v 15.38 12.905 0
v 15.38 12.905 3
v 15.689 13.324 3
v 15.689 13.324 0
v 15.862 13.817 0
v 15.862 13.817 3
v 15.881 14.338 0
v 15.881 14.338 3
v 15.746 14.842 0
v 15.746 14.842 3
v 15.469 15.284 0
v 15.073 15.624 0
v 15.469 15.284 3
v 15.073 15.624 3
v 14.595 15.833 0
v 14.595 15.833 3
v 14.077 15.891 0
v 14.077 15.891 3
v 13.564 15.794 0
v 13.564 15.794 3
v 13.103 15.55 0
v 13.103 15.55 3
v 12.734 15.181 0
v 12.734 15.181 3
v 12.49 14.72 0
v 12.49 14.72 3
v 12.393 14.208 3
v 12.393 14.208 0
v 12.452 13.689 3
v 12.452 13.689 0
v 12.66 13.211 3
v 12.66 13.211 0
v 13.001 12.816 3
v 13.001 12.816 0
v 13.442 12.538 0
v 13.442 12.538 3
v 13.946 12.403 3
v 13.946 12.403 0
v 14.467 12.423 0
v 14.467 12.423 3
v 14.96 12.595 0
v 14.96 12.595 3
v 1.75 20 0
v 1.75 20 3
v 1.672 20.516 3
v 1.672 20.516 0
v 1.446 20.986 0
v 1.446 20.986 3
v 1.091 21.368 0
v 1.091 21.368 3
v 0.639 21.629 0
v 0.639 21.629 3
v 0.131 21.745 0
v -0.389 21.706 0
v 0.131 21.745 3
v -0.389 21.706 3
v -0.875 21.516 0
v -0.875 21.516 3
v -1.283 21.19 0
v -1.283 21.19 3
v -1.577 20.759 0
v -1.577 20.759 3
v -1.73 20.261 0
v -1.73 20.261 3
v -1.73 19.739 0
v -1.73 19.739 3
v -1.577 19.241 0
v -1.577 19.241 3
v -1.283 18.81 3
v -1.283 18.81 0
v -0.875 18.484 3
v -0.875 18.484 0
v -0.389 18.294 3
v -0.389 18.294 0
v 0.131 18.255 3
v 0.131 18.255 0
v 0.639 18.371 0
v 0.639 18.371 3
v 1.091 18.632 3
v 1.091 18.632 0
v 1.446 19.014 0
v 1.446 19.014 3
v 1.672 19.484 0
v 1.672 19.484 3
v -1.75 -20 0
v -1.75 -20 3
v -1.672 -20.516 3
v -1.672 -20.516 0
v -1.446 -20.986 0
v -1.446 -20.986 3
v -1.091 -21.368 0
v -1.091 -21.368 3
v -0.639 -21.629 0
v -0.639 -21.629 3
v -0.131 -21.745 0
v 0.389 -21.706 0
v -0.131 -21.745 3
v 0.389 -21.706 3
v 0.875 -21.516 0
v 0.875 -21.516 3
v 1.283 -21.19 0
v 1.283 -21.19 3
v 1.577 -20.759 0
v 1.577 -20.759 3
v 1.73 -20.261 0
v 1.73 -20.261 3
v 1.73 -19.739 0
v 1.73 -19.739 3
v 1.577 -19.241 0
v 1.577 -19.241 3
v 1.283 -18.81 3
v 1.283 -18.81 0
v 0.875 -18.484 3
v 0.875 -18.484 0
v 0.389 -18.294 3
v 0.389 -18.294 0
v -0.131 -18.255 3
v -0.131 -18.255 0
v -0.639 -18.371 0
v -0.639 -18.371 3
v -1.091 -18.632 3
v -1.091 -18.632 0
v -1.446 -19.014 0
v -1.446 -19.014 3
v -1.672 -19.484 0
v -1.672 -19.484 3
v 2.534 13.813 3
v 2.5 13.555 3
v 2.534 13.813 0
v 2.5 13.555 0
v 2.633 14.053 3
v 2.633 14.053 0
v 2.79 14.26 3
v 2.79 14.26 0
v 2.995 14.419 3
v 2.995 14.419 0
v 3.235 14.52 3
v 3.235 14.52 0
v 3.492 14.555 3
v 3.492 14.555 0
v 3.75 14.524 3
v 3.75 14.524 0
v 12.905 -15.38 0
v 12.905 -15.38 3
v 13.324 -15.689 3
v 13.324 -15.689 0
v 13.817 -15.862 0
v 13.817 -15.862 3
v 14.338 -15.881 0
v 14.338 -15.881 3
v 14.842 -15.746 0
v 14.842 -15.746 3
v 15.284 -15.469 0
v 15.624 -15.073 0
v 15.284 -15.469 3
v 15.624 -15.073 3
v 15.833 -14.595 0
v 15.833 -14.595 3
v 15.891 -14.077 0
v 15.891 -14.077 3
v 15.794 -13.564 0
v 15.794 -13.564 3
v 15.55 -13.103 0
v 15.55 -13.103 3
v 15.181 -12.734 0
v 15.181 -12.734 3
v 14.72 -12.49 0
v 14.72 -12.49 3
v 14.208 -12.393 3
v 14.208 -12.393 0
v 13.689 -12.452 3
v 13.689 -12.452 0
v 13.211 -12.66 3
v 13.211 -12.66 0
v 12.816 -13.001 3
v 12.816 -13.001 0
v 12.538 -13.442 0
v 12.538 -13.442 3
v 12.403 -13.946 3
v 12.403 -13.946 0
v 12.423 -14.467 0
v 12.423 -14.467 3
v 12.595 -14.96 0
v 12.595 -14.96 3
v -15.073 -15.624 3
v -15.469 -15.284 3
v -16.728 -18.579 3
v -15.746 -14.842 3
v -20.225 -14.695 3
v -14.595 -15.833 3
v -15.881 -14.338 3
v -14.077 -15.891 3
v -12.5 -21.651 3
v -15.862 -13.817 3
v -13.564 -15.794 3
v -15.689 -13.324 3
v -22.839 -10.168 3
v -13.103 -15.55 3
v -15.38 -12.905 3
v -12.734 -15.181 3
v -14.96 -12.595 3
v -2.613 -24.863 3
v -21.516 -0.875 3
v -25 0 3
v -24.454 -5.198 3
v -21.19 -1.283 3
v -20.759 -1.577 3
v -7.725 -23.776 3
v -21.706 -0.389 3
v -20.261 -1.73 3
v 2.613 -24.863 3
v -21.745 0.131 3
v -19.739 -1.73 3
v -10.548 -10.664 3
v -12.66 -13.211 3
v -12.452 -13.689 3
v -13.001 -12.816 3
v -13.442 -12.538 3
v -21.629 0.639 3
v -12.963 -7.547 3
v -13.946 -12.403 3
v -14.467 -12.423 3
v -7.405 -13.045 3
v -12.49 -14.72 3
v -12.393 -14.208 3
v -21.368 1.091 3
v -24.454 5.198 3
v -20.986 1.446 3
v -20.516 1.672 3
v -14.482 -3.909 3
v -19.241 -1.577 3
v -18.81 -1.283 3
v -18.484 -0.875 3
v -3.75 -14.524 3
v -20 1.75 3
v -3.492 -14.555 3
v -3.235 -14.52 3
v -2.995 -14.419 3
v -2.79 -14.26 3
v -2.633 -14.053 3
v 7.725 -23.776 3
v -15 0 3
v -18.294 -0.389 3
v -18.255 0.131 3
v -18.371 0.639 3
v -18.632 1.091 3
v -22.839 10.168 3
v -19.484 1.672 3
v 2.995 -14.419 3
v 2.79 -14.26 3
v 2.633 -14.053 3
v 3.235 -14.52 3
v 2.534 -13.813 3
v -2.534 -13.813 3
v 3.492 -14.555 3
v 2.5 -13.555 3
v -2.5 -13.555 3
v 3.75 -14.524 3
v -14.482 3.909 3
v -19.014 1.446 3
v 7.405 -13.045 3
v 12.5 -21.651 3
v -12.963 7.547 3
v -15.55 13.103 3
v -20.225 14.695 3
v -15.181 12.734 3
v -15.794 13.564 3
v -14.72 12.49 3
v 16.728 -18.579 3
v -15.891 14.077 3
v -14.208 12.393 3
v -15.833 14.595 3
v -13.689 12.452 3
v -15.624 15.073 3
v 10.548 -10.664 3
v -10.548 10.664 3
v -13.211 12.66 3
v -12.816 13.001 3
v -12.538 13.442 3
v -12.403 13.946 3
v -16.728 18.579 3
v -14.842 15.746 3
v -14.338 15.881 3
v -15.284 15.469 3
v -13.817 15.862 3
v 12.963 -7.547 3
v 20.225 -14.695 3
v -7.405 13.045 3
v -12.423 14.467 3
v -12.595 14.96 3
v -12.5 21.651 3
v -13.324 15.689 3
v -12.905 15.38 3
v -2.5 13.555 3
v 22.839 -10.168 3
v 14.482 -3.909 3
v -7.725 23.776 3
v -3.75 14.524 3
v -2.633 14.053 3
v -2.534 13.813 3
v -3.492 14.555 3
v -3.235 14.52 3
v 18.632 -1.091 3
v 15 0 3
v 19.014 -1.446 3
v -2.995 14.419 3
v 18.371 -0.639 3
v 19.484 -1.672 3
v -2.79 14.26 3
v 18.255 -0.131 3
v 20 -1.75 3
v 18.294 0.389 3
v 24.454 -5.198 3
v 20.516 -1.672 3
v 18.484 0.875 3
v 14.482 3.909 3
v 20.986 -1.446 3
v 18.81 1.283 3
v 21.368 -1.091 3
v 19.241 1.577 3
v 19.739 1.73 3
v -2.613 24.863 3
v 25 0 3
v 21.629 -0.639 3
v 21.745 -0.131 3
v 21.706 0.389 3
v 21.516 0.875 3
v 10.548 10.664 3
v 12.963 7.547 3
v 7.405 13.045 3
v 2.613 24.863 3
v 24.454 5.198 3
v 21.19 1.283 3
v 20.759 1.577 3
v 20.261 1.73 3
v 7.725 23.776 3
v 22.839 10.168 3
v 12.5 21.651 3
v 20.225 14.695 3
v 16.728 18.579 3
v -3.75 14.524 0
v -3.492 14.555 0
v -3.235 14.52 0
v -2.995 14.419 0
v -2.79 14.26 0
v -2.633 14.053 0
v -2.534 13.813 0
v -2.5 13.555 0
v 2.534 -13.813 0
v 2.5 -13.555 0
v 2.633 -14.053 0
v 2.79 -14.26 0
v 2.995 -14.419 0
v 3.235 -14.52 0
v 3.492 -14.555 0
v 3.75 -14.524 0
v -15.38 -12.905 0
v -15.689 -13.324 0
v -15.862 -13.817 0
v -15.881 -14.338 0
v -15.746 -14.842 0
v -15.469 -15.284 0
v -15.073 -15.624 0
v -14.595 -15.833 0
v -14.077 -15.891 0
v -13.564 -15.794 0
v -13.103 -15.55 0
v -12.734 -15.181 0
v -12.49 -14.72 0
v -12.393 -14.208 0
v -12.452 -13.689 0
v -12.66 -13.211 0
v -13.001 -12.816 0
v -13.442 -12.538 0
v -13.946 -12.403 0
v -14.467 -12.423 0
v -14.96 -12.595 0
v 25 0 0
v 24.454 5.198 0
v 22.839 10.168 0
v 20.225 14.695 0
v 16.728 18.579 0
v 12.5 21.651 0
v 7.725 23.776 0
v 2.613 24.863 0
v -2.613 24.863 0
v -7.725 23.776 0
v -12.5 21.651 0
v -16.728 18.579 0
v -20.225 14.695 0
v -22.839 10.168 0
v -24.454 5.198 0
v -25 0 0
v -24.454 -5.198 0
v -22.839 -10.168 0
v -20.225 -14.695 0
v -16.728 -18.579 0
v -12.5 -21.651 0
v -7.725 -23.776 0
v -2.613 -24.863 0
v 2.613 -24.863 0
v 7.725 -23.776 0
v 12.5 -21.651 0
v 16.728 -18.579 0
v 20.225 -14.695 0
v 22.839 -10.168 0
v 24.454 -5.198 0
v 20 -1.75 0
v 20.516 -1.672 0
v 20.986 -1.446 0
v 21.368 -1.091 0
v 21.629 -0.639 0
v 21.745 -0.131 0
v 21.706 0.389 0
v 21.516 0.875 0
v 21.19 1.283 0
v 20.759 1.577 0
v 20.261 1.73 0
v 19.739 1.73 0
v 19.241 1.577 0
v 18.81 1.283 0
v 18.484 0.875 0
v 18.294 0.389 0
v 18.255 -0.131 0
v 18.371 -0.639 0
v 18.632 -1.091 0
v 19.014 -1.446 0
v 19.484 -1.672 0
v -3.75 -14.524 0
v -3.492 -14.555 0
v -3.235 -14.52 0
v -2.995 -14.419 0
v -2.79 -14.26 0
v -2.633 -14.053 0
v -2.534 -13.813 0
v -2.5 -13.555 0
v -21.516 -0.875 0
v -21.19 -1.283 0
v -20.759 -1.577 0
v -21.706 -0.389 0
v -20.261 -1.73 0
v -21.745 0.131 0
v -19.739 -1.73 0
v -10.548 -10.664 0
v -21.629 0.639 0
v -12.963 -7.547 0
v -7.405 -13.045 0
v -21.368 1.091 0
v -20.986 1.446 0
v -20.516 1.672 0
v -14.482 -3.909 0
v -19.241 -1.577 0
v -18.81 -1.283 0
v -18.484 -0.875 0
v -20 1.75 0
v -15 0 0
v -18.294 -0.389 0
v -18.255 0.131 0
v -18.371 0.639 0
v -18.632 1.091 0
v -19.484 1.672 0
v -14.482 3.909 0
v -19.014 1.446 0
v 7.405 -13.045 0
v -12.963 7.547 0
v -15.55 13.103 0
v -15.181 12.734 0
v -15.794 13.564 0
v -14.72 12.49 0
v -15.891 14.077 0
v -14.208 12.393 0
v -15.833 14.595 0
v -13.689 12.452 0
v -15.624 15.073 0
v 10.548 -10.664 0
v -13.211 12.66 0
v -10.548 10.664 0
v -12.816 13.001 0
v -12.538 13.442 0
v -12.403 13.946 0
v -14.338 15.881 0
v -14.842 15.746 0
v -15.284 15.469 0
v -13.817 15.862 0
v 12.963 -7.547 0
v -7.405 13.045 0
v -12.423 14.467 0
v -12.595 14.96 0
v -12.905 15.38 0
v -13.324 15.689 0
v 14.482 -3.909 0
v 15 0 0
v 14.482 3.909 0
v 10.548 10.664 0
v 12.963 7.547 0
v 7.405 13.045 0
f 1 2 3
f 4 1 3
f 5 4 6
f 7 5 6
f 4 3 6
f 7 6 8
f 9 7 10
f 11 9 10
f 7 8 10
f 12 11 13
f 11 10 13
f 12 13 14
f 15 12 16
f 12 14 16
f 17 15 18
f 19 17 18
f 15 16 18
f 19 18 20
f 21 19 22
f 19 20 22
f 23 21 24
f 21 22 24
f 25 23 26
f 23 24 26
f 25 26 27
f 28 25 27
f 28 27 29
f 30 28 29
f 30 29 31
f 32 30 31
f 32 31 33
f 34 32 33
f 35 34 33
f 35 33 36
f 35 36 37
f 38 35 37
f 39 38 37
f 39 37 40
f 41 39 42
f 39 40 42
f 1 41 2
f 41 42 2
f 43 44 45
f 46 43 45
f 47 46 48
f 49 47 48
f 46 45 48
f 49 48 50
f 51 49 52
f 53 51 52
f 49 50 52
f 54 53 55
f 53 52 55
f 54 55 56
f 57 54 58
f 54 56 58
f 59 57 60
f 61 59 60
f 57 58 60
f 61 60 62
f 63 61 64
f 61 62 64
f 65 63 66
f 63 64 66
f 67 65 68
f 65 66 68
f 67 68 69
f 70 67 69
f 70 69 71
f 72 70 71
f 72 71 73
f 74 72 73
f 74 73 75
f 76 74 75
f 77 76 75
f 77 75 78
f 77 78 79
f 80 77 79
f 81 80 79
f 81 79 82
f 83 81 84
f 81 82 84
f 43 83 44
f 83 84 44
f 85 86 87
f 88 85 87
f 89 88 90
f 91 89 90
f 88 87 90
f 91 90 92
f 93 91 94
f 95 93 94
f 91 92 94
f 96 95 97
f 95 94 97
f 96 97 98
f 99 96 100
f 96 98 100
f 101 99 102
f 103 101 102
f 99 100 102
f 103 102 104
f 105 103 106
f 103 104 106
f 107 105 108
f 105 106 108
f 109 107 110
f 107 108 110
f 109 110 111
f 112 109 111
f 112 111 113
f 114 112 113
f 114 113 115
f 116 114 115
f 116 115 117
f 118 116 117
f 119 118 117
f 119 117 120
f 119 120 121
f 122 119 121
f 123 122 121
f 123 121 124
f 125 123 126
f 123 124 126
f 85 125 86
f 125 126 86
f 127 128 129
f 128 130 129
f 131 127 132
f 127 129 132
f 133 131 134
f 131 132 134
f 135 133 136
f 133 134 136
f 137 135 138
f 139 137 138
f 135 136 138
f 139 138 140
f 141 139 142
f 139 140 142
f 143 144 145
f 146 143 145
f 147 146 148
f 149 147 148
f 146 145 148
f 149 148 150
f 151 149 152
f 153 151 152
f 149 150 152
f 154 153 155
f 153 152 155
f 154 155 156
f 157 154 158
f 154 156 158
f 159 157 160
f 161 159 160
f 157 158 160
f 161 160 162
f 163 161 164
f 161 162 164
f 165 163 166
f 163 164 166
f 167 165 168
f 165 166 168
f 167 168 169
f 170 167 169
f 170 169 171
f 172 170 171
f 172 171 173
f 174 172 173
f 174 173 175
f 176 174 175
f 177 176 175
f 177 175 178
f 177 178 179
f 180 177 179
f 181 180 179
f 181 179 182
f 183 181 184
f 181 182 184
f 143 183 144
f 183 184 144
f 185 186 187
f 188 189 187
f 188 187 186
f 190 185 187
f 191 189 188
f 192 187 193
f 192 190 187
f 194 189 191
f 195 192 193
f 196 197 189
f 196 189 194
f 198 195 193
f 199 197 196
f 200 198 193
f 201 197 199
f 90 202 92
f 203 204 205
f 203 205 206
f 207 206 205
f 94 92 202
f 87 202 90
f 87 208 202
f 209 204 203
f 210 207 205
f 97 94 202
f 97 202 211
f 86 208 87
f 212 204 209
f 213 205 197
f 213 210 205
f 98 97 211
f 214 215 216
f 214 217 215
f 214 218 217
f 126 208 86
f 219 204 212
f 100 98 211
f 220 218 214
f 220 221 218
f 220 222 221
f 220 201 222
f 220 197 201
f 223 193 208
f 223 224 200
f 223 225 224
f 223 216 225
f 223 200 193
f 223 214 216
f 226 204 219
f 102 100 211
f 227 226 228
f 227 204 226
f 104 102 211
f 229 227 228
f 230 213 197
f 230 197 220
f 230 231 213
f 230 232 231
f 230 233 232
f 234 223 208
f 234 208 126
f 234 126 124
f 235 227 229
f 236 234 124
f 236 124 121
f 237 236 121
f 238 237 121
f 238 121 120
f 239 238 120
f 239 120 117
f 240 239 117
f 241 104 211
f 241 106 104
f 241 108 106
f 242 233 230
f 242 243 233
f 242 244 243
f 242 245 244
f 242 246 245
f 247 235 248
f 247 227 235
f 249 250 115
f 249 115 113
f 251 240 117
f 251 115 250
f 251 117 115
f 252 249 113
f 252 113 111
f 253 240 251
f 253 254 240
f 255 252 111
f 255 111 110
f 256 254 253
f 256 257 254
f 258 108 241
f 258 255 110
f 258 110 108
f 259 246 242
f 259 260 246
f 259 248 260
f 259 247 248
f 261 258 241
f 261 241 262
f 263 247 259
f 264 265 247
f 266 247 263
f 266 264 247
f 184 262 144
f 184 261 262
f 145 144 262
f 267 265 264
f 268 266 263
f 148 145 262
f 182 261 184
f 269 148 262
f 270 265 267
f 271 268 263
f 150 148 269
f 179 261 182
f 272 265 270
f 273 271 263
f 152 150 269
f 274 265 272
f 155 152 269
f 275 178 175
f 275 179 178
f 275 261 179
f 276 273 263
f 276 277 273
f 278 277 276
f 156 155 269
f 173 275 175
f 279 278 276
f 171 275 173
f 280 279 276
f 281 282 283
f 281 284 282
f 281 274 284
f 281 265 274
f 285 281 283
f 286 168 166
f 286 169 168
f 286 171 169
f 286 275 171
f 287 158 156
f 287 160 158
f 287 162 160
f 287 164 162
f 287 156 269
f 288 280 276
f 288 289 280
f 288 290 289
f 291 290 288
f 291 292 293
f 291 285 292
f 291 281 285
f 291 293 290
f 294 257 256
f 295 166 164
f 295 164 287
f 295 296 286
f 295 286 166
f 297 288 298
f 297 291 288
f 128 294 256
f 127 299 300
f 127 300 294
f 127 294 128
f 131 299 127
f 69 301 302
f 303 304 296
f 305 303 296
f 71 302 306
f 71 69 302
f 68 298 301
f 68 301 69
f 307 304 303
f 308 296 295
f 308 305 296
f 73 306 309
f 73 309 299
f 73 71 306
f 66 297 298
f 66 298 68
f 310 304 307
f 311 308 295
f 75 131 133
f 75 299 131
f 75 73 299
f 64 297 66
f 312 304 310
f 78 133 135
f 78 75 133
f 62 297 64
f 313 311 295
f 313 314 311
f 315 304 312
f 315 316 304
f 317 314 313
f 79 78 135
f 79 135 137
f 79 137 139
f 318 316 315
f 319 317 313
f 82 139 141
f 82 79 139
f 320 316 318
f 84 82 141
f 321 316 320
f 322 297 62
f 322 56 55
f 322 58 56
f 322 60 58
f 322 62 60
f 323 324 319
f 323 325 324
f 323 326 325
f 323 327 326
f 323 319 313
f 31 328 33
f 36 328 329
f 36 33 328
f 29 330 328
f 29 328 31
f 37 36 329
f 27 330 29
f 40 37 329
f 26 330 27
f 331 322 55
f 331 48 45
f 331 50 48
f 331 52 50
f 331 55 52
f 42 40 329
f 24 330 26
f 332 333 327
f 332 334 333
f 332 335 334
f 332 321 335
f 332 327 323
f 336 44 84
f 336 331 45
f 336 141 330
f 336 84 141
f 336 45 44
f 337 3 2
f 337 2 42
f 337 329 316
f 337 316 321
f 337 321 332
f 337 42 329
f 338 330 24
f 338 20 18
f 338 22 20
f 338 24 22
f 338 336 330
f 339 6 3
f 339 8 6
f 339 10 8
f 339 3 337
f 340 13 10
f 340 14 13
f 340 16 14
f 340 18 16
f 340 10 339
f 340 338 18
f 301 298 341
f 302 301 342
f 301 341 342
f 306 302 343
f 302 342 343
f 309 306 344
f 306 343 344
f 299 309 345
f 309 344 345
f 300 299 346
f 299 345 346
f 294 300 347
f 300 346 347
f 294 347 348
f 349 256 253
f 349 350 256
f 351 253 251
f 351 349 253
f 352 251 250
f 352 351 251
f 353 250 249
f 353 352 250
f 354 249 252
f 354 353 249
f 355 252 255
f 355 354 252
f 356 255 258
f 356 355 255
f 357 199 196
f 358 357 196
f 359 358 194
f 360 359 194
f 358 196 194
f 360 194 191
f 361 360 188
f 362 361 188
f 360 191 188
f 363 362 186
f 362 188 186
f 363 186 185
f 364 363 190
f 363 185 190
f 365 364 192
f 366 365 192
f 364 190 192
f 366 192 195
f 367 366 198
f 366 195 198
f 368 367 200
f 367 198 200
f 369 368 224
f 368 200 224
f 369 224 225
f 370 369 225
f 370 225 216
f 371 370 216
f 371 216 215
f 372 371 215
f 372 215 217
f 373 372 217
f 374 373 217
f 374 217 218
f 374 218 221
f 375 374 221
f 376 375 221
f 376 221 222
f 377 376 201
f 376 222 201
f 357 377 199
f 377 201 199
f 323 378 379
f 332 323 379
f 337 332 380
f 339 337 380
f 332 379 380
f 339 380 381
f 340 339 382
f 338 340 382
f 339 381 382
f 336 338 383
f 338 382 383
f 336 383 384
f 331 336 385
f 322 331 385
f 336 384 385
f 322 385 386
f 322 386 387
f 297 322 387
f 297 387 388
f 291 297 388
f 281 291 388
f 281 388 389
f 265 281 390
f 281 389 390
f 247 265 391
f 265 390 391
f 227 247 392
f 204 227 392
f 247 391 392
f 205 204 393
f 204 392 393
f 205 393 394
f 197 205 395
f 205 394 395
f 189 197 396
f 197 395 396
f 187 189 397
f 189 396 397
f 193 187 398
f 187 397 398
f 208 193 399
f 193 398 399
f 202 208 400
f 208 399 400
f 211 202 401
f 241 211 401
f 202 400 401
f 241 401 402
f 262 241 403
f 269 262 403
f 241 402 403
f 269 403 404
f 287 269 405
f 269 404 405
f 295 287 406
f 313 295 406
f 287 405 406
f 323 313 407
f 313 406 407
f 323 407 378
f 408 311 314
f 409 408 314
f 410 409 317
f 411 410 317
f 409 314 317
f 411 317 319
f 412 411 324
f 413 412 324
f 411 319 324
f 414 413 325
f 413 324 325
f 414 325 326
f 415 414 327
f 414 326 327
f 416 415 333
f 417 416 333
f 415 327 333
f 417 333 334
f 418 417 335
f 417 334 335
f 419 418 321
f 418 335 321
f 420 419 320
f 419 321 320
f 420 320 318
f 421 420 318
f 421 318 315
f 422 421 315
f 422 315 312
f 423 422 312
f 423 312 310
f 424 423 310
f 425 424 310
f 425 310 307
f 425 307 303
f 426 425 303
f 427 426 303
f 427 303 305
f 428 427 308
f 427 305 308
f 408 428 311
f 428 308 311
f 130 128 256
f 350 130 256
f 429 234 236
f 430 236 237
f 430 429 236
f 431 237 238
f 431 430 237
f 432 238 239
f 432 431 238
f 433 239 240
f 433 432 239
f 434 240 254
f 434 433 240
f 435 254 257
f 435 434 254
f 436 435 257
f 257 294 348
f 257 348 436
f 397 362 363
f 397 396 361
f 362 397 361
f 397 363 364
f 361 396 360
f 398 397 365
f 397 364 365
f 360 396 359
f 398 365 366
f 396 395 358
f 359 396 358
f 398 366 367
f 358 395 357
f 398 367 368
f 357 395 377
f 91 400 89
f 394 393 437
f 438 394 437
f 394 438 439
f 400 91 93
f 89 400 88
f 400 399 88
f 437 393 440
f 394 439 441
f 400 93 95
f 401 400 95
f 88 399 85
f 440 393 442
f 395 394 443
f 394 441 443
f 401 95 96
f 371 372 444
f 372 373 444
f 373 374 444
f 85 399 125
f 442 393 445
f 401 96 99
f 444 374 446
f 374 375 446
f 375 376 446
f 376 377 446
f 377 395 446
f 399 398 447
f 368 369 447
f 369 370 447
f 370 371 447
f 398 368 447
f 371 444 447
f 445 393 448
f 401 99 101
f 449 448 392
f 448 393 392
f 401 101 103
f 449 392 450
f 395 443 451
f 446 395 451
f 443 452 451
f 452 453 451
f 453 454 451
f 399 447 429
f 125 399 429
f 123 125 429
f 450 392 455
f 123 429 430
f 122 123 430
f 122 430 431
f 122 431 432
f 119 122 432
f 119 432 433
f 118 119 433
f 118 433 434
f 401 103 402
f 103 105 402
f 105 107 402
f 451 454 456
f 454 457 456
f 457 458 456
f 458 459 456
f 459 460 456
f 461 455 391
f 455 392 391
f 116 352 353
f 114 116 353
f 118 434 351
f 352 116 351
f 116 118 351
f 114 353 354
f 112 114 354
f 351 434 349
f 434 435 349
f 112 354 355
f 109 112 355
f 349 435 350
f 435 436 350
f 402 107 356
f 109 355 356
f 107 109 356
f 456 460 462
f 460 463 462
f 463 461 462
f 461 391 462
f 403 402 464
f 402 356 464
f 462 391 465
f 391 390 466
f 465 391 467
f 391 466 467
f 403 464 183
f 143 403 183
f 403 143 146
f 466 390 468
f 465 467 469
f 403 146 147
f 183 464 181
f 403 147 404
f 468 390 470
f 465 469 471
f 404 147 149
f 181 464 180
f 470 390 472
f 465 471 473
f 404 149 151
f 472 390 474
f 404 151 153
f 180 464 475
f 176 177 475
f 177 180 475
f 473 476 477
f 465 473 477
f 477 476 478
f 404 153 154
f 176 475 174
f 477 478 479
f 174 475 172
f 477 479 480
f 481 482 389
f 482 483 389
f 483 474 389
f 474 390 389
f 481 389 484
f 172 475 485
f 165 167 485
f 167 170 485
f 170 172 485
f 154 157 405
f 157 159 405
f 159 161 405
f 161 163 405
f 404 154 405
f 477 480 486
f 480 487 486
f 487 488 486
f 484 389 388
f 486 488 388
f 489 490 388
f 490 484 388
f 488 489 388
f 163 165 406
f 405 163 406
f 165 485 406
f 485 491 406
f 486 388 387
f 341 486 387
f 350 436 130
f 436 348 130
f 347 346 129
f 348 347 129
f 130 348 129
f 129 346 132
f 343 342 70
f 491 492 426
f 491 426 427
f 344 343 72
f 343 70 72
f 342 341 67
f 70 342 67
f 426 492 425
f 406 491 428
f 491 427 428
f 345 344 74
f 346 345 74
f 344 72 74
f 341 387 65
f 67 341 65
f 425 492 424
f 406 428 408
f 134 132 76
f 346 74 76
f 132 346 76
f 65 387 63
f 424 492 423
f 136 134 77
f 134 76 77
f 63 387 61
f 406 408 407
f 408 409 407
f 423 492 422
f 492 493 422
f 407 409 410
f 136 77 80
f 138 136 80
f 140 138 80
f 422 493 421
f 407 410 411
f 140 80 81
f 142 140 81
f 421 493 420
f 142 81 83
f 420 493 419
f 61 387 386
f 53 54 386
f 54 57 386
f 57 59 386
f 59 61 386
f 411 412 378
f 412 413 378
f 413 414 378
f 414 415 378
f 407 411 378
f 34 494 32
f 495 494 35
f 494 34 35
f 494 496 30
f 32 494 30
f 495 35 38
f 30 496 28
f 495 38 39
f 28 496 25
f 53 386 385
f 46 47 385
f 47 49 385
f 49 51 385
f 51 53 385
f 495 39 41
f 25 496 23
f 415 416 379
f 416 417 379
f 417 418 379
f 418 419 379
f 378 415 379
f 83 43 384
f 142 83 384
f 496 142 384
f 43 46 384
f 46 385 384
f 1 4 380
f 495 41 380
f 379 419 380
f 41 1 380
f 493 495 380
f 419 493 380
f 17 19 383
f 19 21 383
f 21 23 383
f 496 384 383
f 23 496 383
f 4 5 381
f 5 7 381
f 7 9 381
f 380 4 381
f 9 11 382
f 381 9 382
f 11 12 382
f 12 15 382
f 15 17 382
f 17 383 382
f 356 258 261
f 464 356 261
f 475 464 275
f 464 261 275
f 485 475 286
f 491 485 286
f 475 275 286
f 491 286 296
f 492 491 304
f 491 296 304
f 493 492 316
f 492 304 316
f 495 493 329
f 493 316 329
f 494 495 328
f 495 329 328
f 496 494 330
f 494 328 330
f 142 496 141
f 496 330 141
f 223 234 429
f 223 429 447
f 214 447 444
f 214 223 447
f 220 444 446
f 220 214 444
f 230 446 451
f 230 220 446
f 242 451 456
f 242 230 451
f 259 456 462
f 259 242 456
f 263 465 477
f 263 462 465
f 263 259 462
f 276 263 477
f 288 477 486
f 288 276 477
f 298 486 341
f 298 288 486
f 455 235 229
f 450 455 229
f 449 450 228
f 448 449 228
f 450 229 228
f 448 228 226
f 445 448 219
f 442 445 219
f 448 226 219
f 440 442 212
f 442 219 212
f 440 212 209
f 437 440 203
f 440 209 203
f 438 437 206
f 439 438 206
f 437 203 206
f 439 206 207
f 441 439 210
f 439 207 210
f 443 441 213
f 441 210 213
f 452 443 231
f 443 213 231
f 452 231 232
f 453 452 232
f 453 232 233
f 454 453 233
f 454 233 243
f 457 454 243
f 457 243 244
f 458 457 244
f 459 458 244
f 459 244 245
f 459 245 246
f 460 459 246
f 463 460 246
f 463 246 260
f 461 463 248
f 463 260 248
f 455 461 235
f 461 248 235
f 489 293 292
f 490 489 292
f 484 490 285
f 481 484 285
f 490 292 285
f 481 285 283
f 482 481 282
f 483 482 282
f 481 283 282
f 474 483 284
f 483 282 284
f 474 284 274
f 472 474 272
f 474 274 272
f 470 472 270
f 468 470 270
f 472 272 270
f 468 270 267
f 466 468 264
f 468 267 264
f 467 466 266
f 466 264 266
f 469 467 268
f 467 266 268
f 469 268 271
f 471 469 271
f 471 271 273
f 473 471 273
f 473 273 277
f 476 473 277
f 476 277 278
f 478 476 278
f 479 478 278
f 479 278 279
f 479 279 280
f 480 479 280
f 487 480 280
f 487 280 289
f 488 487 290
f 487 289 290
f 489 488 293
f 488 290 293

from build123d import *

# Parameters (mm, degrees)
SKETCH1_R           = 25
BOSS_EXTRUDE1_DEPTH = 3
SKETCH2_R           = 1.75
CUT_EXTRUDE1_DEPTH  = 3
CIRPATTERN1_COUNT   = 8
CUT_EXTRUDE2_DEPTH  = 10
FILLET1_R           = 1


with BuildPart() as part:
    # Sketch1 → Boss-Extrude1 (new body)
    with BuildSketch(Plane.XY):
        Circle(SKETCH1_R)
    extrude(amount=BOSS_EXTRUDE1_DEPTH)

    # Sketch2 → Cut-Extrude1 (cut)
    with BuildSketch(Plane.XY.offset(3)):
        with Locations((0, 20)):
            Circle(SKETCH2_R)
    cut_extrude1 = extrude(amount=-CUT_EXTRUDE1_DEPTH, mode=Mode.SUBTRACT)

    # CirPattern1: Cut-Extrude1 ×8 about axis
    cirpattern1_axis = Axis((0, 0, 0), (0, 0, 1))
    for i in range(1, CIRPATTERN1_COUNT):
        add(cut_extrude1.rotate(cirpattern1_axis, i * 360 / CIRPATTERN1_COUNT), mode=Mode.SUBTRACT)

    # Sketch3 → Cut-Extrude2 (cut)
    with BuildSketch(Plane.XY.offset(3)):
        with BuildLine():
            Line((-2.5, 14.790199458), (-2.5, -14.790199458))
            ThreePointArc((-2.5, -14.790199458), (-15, 0), (-2.5, 14.790199458))
        make_face()
        with BuildLine():
            Line((2.5, 14.790199458), (2.5, -14.790199458))
            ThreePointArc((2.5, -14.790199458), (15, 0), (2.5, 14.790199458))
        make_face()
    extrude(amount=-CUT_EXTRUDE2_DEPTH, mode=Mode.SUBTRACT)

    # Fillet1
    fillet1_edges = [part.edges().sort_by_distance(p)[0] for p in [
        (-2.5, -14.790199458, 1.5),
        (-2.5, 14.790199458, 1.5),
        (2.5, 14.790199458, 1.5),
        (2.5, -14.790199458, 1.5),
    ]]
    fillet(fillet1_edges, radius=FILLET1_R)


solid = part.part
